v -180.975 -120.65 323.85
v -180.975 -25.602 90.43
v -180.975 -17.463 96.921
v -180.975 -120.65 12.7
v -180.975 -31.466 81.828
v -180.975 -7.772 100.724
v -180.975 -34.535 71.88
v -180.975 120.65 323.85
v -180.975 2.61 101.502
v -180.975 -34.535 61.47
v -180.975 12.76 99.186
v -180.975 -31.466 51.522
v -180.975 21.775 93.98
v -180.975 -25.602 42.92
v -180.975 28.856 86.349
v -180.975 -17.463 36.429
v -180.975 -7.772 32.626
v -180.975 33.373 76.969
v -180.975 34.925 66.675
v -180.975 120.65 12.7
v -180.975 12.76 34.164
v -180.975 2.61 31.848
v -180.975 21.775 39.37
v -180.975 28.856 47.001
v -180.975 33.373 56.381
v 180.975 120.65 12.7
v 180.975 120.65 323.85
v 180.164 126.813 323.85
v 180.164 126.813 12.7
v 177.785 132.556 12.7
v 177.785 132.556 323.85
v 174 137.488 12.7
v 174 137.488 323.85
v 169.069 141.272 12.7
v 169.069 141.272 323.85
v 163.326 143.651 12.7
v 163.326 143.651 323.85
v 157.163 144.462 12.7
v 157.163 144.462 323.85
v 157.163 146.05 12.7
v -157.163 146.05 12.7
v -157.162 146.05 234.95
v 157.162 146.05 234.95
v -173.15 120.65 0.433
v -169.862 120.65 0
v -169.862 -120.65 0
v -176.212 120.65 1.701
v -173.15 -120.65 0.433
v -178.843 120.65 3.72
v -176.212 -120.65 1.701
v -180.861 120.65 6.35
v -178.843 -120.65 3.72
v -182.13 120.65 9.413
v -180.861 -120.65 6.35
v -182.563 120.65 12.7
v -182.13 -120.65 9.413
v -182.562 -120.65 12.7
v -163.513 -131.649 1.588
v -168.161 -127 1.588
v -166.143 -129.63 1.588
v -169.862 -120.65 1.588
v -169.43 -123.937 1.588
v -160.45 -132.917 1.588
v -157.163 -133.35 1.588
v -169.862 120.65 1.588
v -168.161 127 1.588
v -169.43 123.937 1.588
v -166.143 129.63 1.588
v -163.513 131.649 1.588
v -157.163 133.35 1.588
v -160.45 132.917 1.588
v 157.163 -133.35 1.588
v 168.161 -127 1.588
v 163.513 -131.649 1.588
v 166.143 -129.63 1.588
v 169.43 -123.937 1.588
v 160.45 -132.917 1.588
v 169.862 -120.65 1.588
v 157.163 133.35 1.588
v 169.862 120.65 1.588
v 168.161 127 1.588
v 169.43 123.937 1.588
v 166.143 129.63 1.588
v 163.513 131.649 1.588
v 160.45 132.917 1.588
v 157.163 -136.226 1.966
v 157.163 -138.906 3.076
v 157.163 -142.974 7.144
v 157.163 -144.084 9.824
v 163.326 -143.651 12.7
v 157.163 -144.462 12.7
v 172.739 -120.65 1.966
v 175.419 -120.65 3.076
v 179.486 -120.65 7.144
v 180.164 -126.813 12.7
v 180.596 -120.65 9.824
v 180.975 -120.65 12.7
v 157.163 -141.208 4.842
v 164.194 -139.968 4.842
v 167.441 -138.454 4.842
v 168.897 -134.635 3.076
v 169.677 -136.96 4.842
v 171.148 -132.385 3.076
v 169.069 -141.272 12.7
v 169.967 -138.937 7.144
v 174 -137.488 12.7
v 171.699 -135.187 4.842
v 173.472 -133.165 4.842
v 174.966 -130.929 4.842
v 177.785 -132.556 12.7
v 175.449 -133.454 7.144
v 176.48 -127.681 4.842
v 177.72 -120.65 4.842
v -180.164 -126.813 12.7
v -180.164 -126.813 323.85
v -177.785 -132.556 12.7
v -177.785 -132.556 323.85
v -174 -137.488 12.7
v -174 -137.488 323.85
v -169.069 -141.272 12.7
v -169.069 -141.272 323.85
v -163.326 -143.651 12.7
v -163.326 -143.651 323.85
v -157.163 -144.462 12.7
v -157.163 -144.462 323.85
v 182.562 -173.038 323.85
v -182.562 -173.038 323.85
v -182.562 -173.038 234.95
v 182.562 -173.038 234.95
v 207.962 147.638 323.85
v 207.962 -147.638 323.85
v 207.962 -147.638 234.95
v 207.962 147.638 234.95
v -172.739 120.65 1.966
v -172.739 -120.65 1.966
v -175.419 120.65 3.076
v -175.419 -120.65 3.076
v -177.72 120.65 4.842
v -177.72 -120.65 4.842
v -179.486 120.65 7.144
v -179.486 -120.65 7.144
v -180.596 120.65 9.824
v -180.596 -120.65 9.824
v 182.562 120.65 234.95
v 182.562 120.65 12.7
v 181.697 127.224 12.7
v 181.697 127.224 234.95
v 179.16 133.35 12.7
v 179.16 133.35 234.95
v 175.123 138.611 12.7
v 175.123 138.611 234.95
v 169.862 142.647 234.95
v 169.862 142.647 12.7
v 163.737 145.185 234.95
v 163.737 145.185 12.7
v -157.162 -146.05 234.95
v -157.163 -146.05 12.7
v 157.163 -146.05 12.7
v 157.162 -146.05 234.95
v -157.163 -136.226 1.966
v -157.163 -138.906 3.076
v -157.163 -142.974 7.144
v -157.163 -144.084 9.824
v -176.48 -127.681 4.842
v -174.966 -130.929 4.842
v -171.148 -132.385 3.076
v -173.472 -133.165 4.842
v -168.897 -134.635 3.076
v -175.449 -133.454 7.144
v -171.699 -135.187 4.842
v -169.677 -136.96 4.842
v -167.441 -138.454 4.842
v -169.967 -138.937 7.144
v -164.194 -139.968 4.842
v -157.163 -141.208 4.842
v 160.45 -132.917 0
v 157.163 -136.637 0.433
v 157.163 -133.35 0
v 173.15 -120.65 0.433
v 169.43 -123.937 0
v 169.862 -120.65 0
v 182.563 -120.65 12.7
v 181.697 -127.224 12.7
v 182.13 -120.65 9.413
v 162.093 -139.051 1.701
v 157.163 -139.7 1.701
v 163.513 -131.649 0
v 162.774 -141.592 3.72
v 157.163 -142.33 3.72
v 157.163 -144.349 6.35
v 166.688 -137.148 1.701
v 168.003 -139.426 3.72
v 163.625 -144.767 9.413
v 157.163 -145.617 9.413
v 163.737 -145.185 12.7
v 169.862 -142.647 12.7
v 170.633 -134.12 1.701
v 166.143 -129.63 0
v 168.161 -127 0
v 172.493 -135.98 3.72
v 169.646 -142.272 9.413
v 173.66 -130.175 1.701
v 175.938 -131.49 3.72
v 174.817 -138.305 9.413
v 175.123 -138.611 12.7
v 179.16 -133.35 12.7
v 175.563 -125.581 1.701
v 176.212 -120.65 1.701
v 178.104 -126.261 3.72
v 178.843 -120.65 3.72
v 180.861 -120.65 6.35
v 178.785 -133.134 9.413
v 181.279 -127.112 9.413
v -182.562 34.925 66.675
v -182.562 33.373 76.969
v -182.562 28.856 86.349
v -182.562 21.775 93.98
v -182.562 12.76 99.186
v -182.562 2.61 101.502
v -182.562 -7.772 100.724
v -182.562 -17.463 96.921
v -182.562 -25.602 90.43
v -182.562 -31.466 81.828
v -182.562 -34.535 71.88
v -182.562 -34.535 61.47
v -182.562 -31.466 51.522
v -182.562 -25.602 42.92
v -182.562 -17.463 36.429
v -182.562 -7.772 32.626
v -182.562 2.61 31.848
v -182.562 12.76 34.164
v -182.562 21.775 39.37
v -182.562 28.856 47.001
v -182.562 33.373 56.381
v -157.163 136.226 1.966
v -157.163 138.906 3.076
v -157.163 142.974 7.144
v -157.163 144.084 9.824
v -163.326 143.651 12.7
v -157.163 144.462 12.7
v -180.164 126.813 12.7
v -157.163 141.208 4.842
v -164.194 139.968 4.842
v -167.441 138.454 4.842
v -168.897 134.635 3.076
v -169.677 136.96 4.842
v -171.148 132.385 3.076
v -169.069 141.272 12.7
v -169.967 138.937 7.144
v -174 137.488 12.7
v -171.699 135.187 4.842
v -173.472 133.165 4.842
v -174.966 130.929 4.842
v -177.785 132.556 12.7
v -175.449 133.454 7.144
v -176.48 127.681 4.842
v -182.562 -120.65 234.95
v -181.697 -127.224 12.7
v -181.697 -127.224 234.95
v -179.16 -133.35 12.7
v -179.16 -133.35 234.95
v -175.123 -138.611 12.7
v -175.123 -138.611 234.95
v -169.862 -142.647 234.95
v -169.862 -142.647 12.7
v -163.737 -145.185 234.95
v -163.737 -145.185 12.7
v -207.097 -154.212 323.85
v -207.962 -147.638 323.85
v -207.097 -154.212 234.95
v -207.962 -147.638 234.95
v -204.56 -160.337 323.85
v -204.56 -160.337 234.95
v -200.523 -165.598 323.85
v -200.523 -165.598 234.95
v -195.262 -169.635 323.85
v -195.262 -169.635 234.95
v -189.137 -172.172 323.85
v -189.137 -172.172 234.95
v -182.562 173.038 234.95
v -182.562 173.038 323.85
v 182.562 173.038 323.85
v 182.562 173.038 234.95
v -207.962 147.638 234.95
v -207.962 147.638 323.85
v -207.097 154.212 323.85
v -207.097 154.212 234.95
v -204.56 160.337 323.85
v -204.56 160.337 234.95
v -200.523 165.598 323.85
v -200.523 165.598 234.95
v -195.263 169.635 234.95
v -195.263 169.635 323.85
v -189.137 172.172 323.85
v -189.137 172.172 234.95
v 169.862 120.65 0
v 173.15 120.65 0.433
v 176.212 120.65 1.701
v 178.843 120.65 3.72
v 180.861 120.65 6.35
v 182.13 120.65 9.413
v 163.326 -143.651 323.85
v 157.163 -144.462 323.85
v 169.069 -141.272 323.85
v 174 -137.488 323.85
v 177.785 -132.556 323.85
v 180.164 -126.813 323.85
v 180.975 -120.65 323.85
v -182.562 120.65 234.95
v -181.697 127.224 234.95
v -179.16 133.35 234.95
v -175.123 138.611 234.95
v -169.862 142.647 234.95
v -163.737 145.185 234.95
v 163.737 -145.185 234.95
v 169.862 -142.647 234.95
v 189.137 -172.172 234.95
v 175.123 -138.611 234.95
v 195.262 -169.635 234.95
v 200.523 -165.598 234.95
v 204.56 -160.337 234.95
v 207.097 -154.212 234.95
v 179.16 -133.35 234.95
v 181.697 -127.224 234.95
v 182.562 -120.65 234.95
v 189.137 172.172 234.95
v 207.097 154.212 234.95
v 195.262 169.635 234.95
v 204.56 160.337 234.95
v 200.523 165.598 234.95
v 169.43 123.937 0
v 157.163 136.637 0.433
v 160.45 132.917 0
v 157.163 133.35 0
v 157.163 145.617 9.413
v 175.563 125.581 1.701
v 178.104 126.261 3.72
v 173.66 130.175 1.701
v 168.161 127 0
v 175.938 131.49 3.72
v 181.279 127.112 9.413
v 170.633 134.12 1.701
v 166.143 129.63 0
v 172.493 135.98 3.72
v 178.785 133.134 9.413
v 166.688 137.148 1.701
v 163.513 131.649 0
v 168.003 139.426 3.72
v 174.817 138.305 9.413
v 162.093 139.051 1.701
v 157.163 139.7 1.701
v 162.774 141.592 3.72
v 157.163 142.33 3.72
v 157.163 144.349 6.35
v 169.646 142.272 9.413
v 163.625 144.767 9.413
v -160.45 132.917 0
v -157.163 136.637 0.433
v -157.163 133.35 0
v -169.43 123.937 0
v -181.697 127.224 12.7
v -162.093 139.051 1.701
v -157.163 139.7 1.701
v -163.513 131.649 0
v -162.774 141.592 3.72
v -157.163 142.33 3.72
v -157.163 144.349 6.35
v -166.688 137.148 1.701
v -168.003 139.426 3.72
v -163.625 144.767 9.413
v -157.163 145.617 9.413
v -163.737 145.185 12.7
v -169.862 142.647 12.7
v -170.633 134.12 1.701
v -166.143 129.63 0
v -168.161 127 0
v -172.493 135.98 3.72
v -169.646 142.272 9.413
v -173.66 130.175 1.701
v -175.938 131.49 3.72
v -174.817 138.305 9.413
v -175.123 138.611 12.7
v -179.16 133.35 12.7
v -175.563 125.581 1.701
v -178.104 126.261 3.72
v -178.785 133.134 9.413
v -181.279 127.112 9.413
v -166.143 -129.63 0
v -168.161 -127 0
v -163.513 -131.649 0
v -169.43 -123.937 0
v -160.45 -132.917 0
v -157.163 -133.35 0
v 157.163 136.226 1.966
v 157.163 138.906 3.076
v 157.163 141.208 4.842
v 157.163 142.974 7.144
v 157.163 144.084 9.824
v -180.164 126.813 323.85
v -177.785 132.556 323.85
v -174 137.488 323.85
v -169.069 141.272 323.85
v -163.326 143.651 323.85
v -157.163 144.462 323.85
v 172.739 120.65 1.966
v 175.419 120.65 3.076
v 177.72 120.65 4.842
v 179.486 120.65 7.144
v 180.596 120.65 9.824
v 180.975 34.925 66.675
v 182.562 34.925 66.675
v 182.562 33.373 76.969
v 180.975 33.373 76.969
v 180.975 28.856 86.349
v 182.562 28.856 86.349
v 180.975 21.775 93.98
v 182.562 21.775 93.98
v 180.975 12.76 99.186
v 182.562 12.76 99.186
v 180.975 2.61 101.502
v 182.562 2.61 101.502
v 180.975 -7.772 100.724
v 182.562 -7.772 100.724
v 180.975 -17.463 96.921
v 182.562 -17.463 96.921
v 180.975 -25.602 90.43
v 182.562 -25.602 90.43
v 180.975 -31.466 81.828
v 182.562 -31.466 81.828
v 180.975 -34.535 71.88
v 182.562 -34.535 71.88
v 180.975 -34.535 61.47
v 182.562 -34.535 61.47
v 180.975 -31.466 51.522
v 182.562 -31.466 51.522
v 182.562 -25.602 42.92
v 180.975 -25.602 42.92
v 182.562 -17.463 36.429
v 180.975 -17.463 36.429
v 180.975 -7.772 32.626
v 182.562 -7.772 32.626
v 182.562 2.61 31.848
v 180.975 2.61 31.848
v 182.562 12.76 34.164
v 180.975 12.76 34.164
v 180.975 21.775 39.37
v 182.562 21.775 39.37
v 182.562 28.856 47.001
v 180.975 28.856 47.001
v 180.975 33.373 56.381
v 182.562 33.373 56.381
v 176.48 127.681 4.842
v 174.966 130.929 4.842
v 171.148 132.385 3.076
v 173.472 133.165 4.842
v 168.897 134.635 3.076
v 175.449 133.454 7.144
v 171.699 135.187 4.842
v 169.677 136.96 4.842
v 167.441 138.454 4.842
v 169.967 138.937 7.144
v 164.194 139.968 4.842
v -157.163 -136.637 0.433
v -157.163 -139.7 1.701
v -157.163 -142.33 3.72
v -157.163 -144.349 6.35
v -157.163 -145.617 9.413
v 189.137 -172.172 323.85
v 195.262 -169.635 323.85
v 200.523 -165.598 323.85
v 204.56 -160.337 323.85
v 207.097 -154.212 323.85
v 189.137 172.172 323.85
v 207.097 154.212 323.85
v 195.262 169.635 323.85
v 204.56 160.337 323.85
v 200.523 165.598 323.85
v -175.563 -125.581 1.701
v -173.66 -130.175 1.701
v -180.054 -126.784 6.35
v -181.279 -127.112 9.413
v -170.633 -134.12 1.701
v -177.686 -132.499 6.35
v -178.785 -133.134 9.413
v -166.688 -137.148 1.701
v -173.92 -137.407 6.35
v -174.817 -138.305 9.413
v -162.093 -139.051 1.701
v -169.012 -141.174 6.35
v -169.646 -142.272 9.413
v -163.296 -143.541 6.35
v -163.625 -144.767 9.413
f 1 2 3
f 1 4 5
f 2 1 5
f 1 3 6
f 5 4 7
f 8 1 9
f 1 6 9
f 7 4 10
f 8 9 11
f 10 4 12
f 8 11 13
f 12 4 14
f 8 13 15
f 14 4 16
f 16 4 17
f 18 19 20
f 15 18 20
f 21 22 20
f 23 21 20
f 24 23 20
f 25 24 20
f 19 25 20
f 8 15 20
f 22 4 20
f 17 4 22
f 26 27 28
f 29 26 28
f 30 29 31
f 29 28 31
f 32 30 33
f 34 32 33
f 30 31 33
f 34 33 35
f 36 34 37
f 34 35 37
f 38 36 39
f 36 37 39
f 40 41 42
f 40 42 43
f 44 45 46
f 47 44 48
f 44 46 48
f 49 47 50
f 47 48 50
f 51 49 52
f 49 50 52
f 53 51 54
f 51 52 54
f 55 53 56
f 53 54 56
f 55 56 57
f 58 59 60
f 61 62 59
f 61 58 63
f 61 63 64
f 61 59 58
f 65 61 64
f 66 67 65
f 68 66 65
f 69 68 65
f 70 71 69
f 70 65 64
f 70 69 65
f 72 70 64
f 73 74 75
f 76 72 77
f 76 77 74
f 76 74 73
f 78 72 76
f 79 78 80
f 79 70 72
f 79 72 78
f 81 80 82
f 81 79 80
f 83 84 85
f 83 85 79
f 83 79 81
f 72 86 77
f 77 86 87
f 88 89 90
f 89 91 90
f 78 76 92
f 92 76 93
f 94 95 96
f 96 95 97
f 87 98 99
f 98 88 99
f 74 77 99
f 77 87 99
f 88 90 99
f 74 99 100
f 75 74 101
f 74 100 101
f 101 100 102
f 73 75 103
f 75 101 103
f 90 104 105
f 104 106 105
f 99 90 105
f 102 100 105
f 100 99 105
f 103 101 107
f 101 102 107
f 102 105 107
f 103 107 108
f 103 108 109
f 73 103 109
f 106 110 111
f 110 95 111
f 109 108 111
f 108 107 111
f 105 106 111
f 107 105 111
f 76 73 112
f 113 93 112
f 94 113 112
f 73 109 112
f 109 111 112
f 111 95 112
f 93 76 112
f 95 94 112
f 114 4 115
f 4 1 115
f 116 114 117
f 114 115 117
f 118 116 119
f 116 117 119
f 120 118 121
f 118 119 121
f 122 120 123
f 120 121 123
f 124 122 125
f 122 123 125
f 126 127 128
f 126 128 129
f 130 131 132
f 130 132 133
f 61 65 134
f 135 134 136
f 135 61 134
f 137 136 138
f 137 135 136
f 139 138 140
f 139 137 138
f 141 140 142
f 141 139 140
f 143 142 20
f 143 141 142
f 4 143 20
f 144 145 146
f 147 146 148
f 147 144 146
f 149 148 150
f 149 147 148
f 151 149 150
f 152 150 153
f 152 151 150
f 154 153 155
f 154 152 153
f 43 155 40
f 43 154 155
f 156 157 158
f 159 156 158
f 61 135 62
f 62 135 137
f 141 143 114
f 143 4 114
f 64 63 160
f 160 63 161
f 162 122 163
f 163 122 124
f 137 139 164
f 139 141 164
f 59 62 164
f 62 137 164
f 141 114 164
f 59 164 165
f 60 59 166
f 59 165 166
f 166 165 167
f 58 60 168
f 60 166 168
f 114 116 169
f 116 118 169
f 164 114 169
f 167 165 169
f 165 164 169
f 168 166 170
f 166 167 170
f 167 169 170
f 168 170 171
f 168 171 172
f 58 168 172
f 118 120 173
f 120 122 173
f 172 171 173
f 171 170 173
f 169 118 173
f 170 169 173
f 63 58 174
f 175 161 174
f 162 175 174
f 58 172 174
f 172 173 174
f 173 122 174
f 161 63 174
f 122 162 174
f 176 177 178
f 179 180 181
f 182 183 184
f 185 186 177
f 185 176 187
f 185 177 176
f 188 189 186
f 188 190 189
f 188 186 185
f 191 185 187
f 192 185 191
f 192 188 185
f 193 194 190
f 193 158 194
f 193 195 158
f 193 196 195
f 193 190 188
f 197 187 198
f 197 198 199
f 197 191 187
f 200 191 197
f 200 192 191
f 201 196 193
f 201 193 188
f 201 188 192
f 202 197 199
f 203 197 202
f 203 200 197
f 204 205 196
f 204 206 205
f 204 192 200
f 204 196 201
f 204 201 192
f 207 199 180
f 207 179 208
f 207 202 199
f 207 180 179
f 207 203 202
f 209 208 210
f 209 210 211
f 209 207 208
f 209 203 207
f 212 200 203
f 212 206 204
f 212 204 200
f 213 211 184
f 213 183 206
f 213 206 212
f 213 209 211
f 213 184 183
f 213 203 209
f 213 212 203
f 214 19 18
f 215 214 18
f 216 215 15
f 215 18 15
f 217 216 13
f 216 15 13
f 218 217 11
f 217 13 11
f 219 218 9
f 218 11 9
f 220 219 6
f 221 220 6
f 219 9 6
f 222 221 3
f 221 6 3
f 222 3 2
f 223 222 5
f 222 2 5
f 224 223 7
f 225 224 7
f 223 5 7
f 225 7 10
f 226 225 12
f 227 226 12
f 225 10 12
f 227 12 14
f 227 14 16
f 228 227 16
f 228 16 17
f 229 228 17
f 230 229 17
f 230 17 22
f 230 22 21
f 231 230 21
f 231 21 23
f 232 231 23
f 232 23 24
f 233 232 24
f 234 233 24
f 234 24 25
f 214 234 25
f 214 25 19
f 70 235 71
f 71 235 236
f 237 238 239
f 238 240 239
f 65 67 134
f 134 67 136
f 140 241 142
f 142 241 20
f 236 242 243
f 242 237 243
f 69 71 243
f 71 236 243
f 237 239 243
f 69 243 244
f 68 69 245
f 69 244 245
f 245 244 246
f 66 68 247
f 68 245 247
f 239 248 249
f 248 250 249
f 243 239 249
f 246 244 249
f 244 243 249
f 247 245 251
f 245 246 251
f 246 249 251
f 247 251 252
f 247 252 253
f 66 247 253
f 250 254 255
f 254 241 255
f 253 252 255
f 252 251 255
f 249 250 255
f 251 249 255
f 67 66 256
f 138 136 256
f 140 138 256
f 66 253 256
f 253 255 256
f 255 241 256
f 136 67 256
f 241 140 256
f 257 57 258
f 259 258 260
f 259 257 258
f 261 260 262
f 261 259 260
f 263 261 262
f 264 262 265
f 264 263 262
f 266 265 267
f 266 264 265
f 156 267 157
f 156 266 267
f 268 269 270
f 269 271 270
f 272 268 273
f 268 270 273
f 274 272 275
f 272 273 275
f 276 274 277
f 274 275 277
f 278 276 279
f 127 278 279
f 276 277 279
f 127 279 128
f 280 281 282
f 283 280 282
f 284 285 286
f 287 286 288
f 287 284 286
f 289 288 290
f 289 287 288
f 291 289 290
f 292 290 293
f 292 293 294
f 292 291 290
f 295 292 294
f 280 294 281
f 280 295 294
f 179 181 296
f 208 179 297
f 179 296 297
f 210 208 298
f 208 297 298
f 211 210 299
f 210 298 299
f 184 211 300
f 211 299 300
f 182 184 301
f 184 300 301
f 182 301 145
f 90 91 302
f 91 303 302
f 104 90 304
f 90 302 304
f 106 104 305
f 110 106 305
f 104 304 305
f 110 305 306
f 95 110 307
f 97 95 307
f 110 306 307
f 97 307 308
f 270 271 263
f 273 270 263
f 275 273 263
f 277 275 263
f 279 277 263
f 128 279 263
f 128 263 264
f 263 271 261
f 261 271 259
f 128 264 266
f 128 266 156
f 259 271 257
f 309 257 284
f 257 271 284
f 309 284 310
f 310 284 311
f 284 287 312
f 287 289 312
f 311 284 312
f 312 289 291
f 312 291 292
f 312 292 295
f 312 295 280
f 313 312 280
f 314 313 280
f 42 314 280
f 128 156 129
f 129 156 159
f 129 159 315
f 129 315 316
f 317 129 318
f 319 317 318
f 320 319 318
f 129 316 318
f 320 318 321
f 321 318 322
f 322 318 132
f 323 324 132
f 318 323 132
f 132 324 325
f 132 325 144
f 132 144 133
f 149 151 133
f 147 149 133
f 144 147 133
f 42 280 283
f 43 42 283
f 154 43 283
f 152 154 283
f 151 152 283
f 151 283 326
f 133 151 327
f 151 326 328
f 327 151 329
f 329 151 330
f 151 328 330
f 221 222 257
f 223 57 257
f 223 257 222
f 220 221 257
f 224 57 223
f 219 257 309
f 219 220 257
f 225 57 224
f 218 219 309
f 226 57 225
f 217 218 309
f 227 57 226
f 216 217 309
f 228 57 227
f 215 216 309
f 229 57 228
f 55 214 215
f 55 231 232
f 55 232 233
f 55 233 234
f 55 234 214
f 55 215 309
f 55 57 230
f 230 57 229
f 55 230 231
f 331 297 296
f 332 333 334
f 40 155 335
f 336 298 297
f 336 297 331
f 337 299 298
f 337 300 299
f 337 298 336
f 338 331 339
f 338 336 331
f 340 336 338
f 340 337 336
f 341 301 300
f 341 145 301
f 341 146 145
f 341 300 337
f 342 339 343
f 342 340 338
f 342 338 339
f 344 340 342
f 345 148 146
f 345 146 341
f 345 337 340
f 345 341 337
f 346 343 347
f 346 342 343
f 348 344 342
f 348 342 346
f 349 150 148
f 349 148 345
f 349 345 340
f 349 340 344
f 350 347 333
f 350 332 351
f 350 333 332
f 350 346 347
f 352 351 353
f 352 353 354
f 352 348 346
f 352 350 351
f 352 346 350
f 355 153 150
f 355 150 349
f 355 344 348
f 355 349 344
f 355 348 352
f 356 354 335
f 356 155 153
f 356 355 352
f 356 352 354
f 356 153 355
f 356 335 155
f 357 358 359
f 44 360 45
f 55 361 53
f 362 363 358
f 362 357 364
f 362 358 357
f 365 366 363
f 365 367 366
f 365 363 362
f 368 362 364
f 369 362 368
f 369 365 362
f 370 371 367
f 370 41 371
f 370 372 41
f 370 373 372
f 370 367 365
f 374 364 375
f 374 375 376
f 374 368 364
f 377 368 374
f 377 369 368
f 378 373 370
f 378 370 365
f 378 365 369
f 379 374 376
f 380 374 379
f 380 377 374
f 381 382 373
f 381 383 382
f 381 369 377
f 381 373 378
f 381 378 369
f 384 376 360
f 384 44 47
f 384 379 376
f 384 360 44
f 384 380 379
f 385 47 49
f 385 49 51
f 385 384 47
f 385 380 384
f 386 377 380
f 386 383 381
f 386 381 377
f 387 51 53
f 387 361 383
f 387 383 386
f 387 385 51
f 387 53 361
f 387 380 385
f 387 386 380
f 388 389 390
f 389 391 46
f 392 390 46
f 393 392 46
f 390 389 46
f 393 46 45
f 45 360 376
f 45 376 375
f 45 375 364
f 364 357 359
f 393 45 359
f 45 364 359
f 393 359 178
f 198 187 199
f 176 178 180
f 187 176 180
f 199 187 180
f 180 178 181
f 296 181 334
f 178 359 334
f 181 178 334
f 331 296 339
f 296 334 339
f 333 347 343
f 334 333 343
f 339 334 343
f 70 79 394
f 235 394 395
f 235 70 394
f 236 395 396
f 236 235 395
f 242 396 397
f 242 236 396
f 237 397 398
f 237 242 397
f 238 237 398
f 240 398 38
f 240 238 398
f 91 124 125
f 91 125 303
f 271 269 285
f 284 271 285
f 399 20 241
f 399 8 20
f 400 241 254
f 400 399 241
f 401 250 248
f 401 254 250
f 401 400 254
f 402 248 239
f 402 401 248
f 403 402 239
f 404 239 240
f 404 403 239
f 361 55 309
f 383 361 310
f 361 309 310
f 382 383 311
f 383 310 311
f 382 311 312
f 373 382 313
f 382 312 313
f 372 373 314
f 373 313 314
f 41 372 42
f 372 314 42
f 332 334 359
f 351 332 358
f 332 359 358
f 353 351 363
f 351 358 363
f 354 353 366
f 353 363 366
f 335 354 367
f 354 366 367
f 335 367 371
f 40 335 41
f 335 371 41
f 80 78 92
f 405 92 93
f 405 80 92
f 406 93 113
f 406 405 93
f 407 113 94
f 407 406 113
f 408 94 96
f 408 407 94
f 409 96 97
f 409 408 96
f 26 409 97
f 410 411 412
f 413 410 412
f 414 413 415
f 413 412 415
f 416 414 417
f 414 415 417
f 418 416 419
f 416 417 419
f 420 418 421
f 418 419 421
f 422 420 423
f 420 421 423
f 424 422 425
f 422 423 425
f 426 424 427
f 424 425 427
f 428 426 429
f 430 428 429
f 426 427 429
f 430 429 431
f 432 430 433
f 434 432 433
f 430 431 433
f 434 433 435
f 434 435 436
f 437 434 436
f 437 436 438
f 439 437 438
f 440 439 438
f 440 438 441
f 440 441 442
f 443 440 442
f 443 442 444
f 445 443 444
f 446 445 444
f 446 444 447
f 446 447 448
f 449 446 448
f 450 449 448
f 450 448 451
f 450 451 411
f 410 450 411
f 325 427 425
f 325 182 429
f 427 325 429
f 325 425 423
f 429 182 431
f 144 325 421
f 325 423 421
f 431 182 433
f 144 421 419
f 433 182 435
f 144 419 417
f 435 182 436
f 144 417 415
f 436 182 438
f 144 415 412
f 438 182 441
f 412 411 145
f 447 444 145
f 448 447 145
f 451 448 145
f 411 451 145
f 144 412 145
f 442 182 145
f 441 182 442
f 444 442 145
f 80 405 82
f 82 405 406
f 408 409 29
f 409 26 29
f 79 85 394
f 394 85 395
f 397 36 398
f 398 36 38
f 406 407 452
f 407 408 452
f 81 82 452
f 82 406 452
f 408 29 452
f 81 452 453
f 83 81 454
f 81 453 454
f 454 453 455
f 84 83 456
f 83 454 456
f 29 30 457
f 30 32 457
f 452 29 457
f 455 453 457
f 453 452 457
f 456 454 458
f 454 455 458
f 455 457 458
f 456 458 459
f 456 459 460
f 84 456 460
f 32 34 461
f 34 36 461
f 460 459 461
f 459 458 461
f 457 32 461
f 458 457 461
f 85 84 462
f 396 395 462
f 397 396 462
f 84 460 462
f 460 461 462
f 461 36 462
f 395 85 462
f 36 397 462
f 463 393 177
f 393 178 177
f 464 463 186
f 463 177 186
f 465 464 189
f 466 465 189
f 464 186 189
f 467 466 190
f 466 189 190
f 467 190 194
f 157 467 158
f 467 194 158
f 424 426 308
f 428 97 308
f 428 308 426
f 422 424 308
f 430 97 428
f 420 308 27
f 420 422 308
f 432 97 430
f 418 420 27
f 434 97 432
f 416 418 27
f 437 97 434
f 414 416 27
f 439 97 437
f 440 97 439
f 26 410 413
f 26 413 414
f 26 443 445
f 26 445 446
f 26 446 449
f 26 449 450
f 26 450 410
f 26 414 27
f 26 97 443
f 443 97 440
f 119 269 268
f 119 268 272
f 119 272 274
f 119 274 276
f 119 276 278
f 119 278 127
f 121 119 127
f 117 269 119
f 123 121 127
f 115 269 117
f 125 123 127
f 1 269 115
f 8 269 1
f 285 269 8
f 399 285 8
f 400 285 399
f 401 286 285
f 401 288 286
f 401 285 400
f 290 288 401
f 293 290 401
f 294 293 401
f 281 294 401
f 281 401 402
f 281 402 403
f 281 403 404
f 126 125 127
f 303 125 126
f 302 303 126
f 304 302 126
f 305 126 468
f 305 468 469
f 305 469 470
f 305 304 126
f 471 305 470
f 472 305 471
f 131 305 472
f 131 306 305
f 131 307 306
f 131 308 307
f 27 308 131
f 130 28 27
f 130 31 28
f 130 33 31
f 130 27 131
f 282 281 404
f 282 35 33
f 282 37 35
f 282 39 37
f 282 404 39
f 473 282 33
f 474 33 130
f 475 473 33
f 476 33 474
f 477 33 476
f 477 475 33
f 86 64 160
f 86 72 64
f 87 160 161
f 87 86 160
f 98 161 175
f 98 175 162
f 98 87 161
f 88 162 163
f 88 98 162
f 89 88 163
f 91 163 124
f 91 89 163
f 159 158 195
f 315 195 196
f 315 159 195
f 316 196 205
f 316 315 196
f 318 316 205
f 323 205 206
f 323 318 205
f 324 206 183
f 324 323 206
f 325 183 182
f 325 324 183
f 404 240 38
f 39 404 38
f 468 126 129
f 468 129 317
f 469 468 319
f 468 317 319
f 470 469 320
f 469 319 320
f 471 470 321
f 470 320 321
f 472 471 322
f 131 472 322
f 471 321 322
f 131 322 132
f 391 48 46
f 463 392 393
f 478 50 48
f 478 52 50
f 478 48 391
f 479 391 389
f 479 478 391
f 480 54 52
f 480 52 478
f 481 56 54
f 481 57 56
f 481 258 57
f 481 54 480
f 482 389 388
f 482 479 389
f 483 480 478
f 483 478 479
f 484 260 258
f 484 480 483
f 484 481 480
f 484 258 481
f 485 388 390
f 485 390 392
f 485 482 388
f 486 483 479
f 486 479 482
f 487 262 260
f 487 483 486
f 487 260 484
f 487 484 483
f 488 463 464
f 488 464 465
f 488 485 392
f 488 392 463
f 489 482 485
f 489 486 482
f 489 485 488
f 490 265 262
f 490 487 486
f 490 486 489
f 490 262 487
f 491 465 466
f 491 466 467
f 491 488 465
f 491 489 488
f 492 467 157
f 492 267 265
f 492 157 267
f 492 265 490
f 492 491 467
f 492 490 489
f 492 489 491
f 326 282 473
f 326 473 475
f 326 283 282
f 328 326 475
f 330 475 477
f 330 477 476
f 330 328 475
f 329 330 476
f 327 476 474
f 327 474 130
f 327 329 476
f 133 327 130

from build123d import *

# Parameters (mm, degrees)
F0_W     = 365.125
F0_H     = 292.1
F1_DEPTH = 323.85
F2_R     = 25.4
F3_R     = 12.7
F4_T     = -1.5875
F5_R     = 34.925
F6_DEPTH = 365.126
F7_W     = 415.925
F7_H     = 346.075
F8_DEPTH = 88.9
F9_R     = 25.4


with BuildPart() as f1:
    # F0 (on Top) → F1 (new body)
    with BuildSketch(Plane.XY):
        Rectangle(F0_W, F0_H)
    extrude(amount=F1_DEPTH)

    # F2
    f2_edges = [f1.edges().sort_by_distance(p)[0] for p in [
        (-182.5625, -146.05, 161.925),
        (182.5625, -146.05, 161.925),
        (182.5625, 146.05, 161.925),
        (-182.5625, 146.05, 161.925),
    ]]
    fillet(f2_edges, radius=F2_R)

    # F3
    f3_edges = [f1.edges().sort_by_distance(p)[0] for p in [
        (0, -146.05, 0),
    ]]
    fillet(f3_edges, radius=F3_R)

    # F4
    f4_openings = [f1.faces().sort_by_distance(p)[0] for p in [
        (0, 0, 323.85),
    ]]
    offset(amount=F4_T, openings=f4_openings)

    # F5 (on face) → F6 (cut, through all)
    with BuildSketch(Plane.YZ.offset(182.5625)):
        with Locations((0, 66.675)):
            Circle(F5_R)
    extrude(amount=-F6_DEPTH, mode=Mode.SUBTRACT)

    # F7 (on face) → F8 (join)
    with BuildSketch(Plane.XY.offset(323.85)):
        Rectangle(F7_W, F7_H)
        with BuildLine():
            Line((-182.5625, -120.65), (-182.5625, 120.65))
            ThreePointArc((-182.5625, 120.65), (-175.123012, 138.610512), (-157.1625, 146.05))
            Line((-157.1625, 146.05), (157.1625, 146.05))
            ThreePointArc((157.1625, 146.05), (175.123012, 138.610512), (182.5625, 120.65))
            Line((182.5625, 120.65), (182.5625, -120.65))
            ThreePointArc((182.5625, -120.65), (175.123012, -138.610512), (157.1625, -146.05))
            Line((157.1625, -146.05), (-157.1625, -146.05))
            ThreePointArc((-157.1625, -146.05), (-175.123012, -138.610512), (-182.5625, -120.65))
        make_face(mode=Mode.SUBTRACT)
    extrude(amount=-F8_DEPTH)

    # F9
    f9_edges = [f1.edges().sort_by_distance(p)[0] for p in [
        (-207.9625, -173.0375, 279.4),
        (207.9625, -173.0375, 279.4),
        (207.9625, 173.0375, 279.4),
        (-207.9625, 173.0375, 279.4),
    ]]
    fillet(f9_edges, radius=F9_R)


solid = f1.part
